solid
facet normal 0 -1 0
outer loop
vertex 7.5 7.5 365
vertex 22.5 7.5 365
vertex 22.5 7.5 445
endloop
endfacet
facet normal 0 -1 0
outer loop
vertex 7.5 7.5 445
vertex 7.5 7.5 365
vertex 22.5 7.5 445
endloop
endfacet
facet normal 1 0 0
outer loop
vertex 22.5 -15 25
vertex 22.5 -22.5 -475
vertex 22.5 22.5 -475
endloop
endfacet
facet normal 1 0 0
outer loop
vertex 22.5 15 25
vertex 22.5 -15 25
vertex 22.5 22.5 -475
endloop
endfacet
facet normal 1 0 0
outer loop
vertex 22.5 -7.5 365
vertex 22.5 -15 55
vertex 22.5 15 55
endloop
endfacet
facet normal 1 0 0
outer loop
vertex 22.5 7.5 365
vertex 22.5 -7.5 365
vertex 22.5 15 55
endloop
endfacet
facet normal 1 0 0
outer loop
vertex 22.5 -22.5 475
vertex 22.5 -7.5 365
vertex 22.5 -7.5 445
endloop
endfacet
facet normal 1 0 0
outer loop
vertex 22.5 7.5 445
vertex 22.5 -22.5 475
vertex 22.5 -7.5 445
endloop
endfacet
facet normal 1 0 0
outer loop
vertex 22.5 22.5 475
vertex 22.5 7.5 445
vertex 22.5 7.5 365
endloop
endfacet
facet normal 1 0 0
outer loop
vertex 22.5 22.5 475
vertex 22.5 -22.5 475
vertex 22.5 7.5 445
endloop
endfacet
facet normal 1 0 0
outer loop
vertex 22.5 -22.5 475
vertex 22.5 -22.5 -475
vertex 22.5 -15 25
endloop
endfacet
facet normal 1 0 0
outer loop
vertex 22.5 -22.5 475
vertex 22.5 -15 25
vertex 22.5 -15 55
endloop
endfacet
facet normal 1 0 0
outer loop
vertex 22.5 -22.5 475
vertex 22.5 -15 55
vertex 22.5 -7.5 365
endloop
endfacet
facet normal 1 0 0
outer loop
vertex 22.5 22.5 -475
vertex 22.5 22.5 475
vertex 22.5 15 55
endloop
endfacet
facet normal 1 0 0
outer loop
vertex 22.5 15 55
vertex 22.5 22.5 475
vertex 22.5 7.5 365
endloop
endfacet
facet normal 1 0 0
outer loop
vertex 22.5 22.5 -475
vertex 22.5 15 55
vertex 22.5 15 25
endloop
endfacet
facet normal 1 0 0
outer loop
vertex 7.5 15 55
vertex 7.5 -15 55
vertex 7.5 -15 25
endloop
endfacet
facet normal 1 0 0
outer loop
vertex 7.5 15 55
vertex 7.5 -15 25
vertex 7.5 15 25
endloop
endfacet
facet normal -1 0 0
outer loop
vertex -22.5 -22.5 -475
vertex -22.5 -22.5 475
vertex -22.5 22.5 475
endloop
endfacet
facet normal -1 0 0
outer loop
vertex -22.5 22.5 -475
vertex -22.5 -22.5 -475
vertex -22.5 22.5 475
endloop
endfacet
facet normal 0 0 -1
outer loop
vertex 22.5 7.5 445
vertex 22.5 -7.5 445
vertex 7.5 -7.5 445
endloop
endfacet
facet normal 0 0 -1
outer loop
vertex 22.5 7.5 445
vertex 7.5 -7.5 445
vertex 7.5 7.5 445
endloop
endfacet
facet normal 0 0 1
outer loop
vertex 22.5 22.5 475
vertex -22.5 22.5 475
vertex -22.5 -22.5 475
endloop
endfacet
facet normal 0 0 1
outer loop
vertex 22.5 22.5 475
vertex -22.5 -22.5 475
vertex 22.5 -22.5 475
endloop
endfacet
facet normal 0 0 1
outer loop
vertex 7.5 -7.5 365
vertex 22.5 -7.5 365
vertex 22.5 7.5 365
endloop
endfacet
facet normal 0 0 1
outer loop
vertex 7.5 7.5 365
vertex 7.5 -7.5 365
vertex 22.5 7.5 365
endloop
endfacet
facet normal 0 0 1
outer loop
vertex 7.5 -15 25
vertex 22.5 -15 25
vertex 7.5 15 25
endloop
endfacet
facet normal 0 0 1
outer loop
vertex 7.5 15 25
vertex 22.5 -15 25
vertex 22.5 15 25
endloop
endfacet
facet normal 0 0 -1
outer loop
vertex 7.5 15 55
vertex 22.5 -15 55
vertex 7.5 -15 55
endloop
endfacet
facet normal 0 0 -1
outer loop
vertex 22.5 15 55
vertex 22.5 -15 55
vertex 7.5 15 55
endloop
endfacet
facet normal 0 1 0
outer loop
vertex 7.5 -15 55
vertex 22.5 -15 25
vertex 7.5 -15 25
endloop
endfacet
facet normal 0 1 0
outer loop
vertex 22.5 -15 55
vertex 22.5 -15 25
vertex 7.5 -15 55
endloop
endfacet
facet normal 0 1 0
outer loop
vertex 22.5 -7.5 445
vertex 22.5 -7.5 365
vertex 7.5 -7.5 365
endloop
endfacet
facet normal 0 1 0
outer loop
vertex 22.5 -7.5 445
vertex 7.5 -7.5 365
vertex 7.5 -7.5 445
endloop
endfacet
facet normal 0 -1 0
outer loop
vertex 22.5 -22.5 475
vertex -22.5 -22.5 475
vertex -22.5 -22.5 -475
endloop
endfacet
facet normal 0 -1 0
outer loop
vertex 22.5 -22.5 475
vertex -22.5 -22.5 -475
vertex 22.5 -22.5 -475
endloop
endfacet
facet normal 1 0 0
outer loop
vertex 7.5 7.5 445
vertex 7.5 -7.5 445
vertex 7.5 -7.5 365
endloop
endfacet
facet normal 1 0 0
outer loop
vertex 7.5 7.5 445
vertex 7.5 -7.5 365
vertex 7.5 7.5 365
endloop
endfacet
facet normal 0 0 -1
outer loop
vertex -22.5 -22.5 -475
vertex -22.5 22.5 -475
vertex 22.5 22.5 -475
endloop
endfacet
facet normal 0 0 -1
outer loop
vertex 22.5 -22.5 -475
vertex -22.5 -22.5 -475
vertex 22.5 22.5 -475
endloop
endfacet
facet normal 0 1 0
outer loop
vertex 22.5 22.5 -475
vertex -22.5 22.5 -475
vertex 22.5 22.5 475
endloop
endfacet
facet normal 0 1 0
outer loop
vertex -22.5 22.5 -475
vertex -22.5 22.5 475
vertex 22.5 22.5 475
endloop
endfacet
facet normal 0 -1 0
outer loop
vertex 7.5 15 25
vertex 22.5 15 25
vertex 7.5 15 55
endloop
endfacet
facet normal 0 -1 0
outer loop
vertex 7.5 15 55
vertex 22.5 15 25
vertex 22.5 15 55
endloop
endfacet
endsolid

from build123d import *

# Parameters (mm, degrees)
F0_W     = 45
F0_H     = 45
F1_DEPTH = 475
F2_W     = 15
F2_H     = 80
F2_W_2   = 30
F2_H_2   = 30
F3_DEPTH = 15


with BuildPart() as f1:
    # F0 (on Top) → F1 (new body, symmetric)
    with BuildSketch(Plane.XY):
        Rectangle(F0_W, F0_H)
    extrude(amount=F1_DEPTH, both=True)

    # F2 (on face) → F3 (cut)
    with BuildSketch(Plane.YZ.offset(22.5)):
        with Locations((0, 405)):
            Rectangle(F2_W, F2_H)
        with Locations((0, 40)):
            Rectangle(F2_W_2, F2_H_2)
    extrude(amount=-F3_DEPTH, mode=Mode.SUBTRACT)


solid = f1.part
